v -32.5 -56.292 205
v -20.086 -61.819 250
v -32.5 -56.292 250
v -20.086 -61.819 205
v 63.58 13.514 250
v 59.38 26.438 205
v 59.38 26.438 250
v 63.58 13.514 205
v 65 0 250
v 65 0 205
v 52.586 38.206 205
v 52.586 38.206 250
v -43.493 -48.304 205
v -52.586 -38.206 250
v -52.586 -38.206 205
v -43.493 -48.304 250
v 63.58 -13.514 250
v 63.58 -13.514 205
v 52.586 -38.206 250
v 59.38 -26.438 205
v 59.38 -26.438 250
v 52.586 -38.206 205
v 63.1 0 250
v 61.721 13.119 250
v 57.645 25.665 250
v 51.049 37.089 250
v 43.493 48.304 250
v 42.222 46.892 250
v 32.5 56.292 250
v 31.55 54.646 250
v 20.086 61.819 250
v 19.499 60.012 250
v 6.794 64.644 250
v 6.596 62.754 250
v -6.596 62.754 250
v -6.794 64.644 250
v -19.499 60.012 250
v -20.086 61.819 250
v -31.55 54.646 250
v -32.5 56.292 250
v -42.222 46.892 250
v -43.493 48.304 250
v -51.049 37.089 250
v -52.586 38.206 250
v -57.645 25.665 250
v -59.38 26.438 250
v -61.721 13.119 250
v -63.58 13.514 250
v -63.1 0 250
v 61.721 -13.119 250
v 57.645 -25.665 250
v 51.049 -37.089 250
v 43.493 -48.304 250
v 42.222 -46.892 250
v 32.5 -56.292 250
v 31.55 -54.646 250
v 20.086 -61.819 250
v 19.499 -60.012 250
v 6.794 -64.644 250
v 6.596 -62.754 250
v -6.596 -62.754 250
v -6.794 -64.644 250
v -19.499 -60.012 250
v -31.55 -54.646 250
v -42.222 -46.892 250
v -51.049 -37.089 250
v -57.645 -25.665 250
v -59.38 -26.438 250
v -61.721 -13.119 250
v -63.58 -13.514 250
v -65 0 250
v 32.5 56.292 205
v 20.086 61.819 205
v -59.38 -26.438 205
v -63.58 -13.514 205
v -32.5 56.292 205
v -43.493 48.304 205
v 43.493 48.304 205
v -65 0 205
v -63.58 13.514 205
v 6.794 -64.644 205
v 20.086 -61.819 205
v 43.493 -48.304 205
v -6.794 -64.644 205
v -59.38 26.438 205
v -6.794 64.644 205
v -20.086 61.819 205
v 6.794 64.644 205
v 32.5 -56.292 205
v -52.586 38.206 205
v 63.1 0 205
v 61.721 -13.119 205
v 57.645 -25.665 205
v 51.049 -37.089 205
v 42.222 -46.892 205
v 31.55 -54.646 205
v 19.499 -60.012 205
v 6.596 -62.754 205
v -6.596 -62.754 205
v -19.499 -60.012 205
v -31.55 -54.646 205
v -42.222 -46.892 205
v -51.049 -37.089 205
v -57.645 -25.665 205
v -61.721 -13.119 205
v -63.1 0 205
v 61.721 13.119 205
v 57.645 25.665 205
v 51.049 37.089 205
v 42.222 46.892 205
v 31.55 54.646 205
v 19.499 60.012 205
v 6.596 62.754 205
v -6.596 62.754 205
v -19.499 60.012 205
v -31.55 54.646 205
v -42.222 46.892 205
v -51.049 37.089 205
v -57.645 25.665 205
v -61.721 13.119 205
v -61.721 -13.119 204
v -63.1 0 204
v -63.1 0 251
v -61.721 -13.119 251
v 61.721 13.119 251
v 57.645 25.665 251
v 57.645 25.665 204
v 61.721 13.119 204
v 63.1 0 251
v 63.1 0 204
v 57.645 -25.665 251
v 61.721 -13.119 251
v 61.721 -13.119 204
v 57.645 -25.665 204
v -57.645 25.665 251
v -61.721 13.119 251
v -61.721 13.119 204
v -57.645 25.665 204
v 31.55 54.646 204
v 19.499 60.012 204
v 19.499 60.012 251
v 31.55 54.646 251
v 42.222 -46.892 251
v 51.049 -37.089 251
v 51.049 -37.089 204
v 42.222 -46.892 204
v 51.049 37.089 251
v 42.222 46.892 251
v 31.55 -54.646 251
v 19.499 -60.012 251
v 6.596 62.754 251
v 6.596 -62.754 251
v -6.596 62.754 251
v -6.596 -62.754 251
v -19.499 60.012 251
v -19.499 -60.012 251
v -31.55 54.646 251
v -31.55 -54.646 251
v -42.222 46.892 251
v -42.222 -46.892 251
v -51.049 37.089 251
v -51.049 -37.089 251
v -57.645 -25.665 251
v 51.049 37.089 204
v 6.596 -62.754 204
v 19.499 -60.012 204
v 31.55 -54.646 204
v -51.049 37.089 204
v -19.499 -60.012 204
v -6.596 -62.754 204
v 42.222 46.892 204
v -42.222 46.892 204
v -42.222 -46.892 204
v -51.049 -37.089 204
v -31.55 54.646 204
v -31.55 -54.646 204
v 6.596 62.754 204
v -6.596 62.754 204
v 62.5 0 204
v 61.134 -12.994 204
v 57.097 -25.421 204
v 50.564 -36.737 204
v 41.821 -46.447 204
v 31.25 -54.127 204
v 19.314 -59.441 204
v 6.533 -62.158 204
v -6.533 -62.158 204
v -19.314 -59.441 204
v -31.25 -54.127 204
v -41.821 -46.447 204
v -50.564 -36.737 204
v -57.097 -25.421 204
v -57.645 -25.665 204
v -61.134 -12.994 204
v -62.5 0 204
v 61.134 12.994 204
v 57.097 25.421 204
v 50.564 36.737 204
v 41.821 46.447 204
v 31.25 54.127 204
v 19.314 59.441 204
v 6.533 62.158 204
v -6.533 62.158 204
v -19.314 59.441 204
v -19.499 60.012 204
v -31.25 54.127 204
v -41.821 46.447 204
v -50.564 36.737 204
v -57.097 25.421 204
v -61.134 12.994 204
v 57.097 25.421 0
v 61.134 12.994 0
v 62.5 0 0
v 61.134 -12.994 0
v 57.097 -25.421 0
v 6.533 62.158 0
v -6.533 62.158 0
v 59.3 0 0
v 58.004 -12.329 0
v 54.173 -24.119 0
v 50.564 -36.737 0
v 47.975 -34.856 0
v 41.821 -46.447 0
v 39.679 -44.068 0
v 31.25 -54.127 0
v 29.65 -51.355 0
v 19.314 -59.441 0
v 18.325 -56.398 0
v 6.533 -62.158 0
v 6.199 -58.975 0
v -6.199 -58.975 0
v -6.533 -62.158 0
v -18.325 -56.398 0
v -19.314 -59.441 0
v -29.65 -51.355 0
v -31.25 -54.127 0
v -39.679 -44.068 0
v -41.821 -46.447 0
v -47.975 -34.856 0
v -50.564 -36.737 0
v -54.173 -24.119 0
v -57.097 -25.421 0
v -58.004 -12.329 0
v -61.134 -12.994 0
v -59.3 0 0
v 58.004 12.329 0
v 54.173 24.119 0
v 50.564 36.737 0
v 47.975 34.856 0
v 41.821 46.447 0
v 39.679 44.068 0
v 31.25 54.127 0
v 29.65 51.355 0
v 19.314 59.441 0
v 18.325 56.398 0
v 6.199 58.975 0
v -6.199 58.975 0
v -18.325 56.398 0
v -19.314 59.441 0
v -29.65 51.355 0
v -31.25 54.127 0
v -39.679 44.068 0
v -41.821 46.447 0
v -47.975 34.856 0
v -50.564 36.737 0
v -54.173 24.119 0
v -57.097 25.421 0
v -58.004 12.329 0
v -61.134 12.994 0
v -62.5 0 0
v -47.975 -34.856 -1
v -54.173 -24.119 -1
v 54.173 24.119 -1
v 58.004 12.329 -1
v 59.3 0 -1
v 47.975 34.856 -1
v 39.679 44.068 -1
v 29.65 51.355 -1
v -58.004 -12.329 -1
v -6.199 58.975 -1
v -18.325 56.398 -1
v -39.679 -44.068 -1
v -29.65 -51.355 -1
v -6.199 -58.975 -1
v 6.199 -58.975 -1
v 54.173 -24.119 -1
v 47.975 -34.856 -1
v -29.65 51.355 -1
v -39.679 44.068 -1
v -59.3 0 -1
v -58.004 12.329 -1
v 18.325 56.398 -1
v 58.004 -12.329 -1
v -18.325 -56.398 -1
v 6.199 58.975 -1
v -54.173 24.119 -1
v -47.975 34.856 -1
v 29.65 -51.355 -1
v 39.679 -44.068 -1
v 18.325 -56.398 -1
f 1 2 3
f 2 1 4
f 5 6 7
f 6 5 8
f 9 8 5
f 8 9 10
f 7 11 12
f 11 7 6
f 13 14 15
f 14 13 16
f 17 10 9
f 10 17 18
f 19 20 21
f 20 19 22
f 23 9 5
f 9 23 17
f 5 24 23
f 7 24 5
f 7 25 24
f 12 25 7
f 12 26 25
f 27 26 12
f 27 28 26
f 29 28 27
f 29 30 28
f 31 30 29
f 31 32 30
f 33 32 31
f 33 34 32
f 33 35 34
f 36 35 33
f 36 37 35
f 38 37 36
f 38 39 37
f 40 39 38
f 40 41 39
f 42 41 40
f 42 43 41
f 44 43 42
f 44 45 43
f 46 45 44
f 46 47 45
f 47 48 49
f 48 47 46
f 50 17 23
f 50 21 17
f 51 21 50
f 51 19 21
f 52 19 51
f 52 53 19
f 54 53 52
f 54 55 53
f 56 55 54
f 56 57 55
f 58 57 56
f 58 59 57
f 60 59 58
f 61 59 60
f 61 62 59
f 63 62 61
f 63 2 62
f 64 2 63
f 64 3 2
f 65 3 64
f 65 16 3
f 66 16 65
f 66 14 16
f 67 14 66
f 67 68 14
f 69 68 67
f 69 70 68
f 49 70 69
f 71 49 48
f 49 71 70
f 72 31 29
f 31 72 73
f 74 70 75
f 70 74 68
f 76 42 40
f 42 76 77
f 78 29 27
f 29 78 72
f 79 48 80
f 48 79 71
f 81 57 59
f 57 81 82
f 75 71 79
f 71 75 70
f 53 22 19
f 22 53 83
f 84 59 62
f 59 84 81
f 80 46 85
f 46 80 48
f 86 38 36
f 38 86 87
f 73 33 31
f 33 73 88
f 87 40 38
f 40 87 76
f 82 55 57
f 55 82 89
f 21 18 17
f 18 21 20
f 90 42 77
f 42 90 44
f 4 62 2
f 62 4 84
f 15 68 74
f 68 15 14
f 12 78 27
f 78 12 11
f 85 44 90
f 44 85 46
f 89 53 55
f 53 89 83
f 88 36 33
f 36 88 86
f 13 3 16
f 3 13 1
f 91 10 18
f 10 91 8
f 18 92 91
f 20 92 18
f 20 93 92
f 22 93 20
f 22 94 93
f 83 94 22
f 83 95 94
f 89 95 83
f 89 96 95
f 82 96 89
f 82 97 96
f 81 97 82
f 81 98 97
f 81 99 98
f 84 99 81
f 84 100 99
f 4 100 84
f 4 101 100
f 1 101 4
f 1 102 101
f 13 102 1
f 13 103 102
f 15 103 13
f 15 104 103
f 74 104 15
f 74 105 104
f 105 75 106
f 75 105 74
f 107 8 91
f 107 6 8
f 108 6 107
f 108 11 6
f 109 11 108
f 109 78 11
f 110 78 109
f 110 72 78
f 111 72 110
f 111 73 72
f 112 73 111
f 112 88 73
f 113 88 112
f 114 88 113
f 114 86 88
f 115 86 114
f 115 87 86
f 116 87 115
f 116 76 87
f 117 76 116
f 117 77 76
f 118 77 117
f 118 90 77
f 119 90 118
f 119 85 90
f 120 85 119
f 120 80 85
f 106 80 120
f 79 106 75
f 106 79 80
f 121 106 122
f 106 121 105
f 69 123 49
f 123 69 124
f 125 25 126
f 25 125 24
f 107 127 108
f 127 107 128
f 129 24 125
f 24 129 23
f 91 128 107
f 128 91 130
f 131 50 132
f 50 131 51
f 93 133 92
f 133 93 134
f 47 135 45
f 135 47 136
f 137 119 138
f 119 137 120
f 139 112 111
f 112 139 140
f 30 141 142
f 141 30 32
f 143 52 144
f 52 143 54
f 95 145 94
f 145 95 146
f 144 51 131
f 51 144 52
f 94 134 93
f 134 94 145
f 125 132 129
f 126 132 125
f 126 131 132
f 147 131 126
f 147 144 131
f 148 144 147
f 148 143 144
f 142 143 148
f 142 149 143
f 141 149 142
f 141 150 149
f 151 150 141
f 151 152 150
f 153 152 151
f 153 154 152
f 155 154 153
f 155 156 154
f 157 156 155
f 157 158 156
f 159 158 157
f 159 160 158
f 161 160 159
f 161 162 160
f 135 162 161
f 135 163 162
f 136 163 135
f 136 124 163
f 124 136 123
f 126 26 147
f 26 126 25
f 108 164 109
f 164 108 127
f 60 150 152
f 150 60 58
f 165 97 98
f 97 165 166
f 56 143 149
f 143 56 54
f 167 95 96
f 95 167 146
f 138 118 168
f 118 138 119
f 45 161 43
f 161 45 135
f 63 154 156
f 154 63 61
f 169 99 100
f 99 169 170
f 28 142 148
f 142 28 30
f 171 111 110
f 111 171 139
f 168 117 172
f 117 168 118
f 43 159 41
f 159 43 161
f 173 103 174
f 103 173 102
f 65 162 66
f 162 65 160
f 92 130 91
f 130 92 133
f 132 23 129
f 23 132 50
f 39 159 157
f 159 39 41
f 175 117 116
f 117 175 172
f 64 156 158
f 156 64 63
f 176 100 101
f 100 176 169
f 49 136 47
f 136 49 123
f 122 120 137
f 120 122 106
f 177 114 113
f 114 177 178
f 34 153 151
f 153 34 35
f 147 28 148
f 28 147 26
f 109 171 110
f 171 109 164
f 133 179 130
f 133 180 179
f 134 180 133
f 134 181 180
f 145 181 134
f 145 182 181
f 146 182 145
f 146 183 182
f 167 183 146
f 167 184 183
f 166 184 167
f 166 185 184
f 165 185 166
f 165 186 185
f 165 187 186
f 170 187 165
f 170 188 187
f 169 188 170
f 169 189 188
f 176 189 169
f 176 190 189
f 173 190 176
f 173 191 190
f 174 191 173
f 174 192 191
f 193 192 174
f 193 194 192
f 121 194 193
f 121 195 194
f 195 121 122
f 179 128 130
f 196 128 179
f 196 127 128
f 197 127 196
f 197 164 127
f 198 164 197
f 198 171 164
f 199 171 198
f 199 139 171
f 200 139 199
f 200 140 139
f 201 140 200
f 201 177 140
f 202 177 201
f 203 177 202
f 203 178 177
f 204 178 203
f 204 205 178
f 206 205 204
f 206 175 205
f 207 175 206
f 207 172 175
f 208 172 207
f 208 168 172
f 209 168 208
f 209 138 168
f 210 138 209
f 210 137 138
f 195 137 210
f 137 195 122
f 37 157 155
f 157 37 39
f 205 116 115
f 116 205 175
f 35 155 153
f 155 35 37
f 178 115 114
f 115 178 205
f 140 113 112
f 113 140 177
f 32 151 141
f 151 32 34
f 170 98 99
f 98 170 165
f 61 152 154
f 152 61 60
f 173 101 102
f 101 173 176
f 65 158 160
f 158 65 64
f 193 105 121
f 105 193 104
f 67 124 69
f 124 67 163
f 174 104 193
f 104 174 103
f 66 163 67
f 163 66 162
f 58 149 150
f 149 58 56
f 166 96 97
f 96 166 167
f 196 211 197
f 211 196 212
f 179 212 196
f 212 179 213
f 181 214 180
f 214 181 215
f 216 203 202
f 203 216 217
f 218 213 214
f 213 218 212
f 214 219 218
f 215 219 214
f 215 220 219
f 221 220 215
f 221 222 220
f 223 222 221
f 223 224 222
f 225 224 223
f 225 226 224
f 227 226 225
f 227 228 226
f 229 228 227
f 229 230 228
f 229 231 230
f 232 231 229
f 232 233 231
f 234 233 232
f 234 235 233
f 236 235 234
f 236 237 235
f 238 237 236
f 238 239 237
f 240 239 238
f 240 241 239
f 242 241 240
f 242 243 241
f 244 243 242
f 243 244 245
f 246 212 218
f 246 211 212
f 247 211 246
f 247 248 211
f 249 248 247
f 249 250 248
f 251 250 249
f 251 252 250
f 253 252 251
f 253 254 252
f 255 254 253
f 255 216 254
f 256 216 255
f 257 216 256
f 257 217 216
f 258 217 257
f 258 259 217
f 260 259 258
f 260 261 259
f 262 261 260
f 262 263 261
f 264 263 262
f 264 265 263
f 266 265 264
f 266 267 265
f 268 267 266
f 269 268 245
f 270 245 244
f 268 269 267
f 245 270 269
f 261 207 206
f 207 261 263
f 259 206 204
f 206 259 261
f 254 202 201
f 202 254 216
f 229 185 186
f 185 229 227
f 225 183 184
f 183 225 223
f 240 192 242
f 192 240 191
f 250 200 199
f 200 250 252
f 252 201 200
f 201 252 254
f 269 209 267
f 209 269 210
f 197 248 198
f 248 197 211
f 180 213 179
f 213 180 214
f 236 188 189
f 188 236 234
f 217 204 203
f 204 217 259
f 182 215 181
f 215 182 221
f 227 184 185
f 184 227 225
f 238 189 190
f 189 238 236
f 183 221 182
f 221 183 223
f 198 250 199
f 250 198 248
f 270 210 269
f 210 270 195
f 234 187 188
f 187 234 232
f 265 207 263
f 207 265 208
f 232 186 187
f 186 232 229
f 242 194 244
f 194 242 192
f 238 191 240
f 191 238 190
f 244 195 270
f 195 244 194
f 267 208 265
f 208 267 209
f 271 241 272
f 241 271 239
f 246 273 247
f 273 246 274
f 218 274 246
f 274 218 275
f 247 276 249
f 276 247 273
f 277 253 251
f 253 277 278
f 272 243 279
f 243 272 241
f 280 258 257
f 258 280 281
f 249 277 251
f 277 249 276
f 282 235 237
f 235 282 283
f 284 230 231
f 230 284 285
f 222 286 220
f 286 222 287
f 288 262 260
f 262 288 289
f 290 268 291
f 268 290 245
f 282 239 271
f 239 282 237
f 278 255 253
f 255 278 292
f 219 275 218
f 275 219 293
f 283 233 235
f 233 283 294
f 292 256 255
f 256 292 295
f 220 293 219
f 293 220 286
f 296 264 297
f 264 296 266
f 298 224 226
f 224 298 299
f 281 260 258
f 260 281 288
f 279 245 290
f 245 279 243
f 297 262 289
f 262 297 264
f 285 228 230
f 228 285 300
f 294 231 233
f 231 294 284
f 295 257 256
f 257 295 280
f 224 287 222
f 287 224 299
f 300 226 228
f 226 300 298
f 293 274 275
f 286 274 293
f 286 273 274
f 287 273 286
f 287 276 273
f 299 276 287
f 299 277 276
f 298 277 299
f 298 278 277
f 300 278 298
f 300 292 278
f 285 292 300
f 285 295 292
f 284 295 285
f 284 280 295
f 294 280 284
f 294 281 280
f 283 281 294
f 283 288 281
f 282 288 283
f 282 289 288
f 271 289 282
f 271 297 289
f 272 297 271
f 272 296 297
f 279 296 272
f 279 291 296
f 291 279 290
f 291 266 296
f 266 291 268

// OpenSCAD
// Parameters
pipe_outer_diameter = 125; //[90:200:0.5]
wall_thickness = 3.2; //[1.6:6.4:0.1]
length_mm = 250; //[125:500:1]
include_end_fitting = 1; //[0:1:1]
overlap = 1; //[0.5:2:0.1]
fitting_length = 45; //[25:90:1]
fitting_wall_extra = 2.5; //[1:6:0.1]
socket_clearance = 0.6; //[0.2:1.5:0.1]
socket_step_length = 12; //[5:25:1]

// HT Pipe - complete geometry
module ht_pipe() {
  color([0.85, 0.85, 0.8]) {
    // Outer pipe segment
    cylinder(h=length_mm, r=pipe_outer_diameter/2, center=false);

    // Hollow bore
    translate([0, 0, -overlap])
      cylinder(h=length_mm + 2*overlap, r=pipe_outer_diameter/2 - wall_thickness, center=false);

    if (include_end_fitting) {
      // End fitting outer
      translate([0, 0, length_mm - fitting_length])
        cylinder(h=fitting_length, r=pipe_outer_diameter/2 + fitting_wall_extra, center=false);

      // End fitting socket void
      translate([0, 0, length_mm - fitting_length - overlap])
        cylinder(h=fitting_length + 2*overlap, r=pipe_outer_diameter/2 + socket_clearance, center=false);

      // End fitting stop void
      translate([0, 0, length_mm - socket_step_length - overlap])
        cylinder(h=socket_step_length + 2*overlap, r=pipe_outer_diameter/2 - wall_thickness, center=false);
    }
  }
}

// Assembly
module assembly() {
  ht_pipe();
}

assembly();
